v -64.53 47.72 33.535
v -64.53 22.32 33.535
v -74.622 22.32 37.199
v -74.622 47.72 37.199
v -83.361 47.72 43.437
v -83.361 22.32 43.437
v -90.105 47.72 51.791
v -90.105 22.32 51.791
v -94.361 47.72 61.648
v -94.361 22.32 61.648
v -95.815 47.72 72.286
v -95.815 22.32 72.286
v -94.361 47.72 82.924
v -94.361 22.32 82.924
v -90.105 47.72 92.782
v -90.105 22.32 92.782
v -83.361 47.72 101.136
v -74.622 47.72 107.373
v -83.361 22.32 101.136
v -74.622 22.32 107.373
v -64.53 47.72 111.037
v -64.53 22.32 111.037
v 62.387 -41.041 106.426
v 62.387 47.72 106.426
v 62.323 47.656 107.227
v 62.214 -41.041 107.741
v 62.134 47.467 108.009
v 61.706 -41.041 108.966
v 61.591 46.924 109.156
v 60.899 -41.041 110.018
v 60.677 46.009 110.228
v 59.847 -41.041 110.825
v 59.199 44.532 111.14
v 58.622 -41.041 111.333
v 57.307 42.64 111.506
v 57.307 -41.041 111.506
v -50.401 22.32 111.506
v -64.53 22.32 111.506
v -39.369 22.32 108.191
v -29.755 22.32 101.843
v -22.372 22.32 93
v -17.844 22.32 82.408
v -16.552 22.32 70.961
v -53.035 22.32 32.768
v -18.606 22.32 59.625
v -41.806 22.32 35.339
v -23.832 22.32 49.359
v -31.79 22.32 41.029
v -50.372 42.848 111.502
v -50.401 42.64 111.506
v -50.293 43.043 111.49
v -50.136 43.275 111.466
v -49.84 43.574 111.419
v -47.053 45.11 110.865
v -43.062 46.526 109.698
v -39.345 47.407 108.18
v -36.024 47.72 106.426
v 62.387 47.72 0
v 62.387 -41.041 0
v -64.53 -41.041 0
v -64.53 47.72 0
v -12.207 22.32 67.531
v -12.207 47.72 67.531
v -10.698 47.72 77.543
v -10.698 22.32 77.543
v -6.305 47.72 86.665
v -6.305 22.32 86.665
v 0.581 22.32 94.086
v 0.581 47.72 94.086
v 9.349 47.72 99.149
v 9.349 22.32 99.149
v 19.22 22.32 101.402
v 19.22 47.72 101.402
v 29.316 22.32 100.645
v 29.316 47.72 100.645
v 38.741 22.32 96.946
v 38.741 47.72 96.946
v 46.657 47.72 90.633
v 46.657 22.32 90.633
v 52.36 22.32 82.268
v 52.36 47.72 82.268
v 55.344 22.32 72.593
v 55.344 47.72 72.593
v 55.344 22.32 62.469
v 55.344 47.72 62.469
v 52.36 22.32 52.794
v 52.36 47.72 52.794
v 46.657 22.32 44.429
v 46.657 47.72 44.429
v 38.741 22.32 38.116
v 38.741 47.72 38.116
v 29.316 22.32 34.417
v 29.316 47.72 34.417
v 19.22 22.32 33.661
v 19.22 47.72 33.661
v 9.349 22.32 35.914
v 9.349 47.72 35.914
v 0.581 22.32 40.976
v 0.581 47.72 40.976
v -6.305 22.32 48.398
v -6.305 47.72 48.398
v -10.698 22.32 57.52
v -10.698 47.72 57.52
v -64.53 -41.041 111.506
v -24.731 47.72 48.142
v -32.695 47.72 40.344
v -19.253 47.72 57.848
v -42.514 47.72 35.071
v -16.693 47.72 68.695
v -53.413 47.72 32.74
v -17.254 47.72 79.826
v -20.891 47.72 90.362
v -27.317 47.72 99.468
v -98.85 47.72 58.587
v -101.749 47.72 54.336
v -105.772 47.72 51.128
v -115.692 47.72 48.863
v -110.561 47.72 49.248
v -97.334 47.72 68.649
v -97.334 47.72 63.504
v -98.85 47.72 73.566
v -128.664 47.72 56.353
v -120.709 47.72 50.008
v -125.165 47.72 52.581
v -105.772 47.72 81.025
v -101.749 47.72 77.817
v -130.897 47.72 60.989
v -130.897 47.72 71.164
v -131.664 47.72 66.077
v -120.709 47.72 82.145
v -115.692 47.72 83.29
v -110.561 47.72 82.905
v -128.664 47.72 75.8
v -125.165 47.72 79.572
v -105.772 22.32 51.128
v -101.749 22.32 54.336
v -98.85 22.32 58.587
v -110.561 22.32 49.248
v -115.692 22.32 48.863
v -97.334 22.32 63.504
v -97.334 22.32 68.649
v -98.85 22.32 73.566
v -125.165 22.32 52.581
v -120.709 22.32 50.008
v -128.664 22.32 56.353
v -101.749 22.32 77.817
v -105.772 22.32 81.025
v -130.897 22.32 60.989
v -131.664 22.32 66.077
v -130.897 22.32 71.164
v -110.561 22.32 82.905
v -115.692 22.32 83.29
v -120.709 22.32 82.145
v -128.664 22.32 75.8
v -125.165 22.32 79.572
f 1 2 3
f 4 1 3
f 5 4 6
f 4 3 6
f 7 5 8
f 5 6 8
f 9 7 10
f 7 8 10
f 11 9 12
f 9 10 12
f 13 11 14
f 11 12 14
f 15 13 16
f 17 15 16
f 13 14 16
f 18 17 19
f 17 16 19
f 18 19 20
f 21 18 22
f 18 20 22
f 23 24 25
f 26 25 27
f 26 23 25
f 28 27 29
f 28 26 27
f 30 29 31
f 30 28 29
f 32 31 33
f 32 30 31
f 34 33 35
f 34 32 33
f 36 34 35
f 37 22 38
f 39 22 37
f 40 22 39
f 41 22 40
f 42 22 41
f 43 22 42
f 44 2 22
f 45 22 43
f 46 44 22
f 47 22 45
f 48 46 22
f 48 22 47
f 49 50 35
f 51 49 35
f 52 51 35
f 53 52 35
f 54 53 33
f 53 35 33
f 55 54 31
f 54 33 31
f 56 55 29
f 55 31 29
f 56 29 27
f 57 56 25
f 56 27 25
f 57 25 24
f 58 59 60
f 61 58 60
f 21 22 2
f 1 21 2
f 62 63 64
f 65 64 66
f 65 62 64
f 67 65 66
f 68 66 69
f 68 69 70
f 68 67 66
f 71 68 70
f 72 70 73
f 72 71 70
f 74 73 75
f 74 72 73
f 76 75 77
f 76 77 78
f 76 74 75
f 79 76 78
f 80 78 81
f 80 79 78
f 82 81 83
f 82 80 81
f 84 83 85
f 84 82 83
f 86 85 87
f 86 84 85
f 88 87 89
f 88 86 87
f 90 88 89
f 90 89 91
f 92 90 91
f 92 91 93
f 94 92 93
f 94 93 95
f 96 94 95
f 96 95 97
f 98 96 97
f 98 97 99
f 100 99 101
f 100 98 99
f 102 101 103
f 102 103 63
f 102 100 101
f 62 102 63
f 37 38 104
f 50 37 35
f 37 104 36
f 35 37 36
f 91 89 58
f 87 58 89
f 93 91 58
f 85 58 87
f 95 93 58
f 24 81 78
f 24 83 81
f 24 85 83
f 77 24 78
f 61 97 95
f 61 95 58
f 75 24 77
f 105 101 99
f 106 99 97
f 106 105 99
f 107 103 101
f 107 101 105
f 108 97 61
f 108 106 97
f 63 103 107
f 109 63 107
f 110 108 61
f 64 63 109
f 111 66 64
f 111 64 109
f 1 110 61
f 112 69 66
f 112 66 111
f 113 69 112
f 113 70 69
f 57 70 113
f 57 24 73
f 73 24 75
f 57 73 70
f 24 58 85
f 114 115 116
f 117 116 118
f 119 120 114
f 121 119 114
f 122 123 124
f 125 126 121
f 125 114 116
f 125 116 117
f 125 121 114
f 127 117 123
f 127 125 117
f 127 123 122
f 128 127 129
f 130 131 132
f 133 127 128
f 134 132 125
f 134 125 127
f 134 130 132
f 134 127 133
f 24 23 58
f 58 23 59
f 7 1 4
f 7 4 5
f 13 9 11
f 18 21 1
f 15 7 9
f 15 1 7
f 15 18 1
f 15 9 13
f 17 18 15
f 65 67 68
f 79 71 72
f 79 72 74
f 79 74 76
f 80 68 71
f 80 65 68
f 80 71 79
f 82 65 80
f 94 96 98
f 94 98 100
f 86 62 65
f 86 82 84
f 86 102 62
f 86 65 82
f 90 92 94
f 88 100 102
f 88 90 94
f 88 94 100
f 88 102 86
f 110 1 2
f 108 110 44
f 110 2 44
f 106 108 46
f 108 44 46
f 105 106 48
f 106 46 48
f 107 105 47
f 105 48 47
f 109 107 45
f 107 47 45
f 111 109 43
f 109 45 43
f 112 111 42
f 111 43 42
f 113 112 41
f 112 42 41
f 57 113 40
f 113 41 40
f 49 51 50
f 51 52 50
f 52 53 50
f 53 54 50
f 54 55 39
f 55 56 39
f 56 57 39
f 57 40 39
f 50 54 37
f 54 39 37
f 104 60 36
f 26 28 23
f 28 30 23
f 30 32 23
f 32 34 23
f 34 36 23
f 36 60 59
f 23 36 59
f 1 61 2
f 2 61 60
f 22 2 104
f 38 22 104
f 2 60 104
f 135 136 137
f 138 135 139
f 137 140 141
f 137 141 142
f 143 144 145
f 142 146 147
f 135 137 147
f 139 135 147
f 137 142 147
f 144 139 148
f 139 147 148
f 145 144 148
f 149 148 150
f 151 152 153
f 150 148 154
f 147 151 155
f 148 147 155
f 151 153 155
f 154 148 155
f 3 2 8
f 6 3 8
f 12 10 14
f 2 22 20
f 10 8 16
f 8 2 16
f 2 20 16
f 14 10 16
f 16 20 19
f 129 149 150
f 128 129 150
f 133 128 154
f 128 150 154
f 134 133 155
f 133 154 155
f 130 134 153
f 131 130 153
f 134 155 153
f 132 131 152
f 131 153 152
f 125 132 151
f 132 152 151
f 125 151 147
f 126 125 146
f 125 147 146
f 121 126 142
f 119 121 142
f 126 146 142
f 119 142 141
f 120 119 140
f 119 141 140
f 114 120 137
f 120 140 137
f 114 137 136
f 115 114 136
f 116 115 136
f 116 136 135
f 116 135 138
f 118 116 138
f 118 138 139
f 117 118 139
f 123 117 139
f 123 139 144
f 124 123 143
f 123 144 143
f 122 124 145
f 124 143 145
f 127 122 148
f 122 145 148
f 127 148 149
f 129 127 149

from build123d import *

# Parameters (mm, degrees)
F0_W     = 126.9167363644
F0_H     = 63.3608419448
F1_DEPTH = 53.34
F2_DEPTH = 58.166
F3_R     = 17.261452949
F4_DEPTH = 25.4
F3_R_2   = 33.9654092875
F5_R     = 5.08


with BuildPart() as f1:
    # F0 (on Top) → F1 (new body)
    with BuildSketch(Plane.XY):
        with Locations((-1.0712817311, -9.3606365845)):
            Rectangle(F0_W, F0_H)
    extrude(amount=F1_DEPTH)

    # F2 (add): a face of the model
    f2_faces = [f1.faces().sort_by_distance(p)[0] for p in [
        (-1.0712817311, -9.3606365845, 53.34),
    ]]
    extrude(f2_faces, amount=F2_DEPTH)

    # F3 (on face) → F4, piece 2 (join)
    with BuildSketch(Plane(origin=(0, 22.3197843879, 0), x_dir=(-1, 0, 0), z_dir=(0, 1, 0))):
        with BuildLine():
            ThreePointArc((64.5296499133, 33.5347614391), (87.0172235672, 47.3842028932), (95.8146265993, 72.2860842943))
            ThreePointArc((95.8146265993, 72.2860842943), (87.0172235672, 97.1879656955), (64.5296499133, 111.0374071495))
            Line((64.5296499133, 111.0374071495), (64.5296499133, 33.5347614391))
        make_face()
        with BuildLine():
            Line((64.5296499133, 0), (64.5296499133, 33.5347614391))
            ThreePointArc((64.5296499133, 33.5347614391), (17.1653041118, 65.2179208988), (50.4010917462, 111.506))
            Line((50.4010917462, 111.506), (-62.3870864511, 111.506))
            Line((-62.3870864511, 111.506), (-62.3870864511, 0))
            Line((-62.3870864511, 0), (64.5296499133, 0))
        make_face()
        with Locations((-21.7584427446, 67.5311535597)):
            Circle(F3_R_2, mode=Mode.SUBTRACT)
    extrude(amount=F4_DEPTH)

    # F5
    f5_edges = [f1.edges().sort_by_distance(p)[0] for p in [
        (5.992997, 47.719784, 111.506),
        (62.387086, 3.339363, 111.506),
    ]]
    fillet(f5_edges, radius=F5_R)


with BuildPart() as f4:
    # F3 (on face) → F4 (new body)
    with BuildSketch(Plane(origin=(0, 22.3197843879, 0), x_dir=(-1, 0, 0), z_dir=(0, 1, 0))):
        with Locations((114.402346313, 66.0765618086)):
            Circle(F3_R)
    extrude(amount=F4_DEPTH)


solid = Compound([f1.part, f4.part])
